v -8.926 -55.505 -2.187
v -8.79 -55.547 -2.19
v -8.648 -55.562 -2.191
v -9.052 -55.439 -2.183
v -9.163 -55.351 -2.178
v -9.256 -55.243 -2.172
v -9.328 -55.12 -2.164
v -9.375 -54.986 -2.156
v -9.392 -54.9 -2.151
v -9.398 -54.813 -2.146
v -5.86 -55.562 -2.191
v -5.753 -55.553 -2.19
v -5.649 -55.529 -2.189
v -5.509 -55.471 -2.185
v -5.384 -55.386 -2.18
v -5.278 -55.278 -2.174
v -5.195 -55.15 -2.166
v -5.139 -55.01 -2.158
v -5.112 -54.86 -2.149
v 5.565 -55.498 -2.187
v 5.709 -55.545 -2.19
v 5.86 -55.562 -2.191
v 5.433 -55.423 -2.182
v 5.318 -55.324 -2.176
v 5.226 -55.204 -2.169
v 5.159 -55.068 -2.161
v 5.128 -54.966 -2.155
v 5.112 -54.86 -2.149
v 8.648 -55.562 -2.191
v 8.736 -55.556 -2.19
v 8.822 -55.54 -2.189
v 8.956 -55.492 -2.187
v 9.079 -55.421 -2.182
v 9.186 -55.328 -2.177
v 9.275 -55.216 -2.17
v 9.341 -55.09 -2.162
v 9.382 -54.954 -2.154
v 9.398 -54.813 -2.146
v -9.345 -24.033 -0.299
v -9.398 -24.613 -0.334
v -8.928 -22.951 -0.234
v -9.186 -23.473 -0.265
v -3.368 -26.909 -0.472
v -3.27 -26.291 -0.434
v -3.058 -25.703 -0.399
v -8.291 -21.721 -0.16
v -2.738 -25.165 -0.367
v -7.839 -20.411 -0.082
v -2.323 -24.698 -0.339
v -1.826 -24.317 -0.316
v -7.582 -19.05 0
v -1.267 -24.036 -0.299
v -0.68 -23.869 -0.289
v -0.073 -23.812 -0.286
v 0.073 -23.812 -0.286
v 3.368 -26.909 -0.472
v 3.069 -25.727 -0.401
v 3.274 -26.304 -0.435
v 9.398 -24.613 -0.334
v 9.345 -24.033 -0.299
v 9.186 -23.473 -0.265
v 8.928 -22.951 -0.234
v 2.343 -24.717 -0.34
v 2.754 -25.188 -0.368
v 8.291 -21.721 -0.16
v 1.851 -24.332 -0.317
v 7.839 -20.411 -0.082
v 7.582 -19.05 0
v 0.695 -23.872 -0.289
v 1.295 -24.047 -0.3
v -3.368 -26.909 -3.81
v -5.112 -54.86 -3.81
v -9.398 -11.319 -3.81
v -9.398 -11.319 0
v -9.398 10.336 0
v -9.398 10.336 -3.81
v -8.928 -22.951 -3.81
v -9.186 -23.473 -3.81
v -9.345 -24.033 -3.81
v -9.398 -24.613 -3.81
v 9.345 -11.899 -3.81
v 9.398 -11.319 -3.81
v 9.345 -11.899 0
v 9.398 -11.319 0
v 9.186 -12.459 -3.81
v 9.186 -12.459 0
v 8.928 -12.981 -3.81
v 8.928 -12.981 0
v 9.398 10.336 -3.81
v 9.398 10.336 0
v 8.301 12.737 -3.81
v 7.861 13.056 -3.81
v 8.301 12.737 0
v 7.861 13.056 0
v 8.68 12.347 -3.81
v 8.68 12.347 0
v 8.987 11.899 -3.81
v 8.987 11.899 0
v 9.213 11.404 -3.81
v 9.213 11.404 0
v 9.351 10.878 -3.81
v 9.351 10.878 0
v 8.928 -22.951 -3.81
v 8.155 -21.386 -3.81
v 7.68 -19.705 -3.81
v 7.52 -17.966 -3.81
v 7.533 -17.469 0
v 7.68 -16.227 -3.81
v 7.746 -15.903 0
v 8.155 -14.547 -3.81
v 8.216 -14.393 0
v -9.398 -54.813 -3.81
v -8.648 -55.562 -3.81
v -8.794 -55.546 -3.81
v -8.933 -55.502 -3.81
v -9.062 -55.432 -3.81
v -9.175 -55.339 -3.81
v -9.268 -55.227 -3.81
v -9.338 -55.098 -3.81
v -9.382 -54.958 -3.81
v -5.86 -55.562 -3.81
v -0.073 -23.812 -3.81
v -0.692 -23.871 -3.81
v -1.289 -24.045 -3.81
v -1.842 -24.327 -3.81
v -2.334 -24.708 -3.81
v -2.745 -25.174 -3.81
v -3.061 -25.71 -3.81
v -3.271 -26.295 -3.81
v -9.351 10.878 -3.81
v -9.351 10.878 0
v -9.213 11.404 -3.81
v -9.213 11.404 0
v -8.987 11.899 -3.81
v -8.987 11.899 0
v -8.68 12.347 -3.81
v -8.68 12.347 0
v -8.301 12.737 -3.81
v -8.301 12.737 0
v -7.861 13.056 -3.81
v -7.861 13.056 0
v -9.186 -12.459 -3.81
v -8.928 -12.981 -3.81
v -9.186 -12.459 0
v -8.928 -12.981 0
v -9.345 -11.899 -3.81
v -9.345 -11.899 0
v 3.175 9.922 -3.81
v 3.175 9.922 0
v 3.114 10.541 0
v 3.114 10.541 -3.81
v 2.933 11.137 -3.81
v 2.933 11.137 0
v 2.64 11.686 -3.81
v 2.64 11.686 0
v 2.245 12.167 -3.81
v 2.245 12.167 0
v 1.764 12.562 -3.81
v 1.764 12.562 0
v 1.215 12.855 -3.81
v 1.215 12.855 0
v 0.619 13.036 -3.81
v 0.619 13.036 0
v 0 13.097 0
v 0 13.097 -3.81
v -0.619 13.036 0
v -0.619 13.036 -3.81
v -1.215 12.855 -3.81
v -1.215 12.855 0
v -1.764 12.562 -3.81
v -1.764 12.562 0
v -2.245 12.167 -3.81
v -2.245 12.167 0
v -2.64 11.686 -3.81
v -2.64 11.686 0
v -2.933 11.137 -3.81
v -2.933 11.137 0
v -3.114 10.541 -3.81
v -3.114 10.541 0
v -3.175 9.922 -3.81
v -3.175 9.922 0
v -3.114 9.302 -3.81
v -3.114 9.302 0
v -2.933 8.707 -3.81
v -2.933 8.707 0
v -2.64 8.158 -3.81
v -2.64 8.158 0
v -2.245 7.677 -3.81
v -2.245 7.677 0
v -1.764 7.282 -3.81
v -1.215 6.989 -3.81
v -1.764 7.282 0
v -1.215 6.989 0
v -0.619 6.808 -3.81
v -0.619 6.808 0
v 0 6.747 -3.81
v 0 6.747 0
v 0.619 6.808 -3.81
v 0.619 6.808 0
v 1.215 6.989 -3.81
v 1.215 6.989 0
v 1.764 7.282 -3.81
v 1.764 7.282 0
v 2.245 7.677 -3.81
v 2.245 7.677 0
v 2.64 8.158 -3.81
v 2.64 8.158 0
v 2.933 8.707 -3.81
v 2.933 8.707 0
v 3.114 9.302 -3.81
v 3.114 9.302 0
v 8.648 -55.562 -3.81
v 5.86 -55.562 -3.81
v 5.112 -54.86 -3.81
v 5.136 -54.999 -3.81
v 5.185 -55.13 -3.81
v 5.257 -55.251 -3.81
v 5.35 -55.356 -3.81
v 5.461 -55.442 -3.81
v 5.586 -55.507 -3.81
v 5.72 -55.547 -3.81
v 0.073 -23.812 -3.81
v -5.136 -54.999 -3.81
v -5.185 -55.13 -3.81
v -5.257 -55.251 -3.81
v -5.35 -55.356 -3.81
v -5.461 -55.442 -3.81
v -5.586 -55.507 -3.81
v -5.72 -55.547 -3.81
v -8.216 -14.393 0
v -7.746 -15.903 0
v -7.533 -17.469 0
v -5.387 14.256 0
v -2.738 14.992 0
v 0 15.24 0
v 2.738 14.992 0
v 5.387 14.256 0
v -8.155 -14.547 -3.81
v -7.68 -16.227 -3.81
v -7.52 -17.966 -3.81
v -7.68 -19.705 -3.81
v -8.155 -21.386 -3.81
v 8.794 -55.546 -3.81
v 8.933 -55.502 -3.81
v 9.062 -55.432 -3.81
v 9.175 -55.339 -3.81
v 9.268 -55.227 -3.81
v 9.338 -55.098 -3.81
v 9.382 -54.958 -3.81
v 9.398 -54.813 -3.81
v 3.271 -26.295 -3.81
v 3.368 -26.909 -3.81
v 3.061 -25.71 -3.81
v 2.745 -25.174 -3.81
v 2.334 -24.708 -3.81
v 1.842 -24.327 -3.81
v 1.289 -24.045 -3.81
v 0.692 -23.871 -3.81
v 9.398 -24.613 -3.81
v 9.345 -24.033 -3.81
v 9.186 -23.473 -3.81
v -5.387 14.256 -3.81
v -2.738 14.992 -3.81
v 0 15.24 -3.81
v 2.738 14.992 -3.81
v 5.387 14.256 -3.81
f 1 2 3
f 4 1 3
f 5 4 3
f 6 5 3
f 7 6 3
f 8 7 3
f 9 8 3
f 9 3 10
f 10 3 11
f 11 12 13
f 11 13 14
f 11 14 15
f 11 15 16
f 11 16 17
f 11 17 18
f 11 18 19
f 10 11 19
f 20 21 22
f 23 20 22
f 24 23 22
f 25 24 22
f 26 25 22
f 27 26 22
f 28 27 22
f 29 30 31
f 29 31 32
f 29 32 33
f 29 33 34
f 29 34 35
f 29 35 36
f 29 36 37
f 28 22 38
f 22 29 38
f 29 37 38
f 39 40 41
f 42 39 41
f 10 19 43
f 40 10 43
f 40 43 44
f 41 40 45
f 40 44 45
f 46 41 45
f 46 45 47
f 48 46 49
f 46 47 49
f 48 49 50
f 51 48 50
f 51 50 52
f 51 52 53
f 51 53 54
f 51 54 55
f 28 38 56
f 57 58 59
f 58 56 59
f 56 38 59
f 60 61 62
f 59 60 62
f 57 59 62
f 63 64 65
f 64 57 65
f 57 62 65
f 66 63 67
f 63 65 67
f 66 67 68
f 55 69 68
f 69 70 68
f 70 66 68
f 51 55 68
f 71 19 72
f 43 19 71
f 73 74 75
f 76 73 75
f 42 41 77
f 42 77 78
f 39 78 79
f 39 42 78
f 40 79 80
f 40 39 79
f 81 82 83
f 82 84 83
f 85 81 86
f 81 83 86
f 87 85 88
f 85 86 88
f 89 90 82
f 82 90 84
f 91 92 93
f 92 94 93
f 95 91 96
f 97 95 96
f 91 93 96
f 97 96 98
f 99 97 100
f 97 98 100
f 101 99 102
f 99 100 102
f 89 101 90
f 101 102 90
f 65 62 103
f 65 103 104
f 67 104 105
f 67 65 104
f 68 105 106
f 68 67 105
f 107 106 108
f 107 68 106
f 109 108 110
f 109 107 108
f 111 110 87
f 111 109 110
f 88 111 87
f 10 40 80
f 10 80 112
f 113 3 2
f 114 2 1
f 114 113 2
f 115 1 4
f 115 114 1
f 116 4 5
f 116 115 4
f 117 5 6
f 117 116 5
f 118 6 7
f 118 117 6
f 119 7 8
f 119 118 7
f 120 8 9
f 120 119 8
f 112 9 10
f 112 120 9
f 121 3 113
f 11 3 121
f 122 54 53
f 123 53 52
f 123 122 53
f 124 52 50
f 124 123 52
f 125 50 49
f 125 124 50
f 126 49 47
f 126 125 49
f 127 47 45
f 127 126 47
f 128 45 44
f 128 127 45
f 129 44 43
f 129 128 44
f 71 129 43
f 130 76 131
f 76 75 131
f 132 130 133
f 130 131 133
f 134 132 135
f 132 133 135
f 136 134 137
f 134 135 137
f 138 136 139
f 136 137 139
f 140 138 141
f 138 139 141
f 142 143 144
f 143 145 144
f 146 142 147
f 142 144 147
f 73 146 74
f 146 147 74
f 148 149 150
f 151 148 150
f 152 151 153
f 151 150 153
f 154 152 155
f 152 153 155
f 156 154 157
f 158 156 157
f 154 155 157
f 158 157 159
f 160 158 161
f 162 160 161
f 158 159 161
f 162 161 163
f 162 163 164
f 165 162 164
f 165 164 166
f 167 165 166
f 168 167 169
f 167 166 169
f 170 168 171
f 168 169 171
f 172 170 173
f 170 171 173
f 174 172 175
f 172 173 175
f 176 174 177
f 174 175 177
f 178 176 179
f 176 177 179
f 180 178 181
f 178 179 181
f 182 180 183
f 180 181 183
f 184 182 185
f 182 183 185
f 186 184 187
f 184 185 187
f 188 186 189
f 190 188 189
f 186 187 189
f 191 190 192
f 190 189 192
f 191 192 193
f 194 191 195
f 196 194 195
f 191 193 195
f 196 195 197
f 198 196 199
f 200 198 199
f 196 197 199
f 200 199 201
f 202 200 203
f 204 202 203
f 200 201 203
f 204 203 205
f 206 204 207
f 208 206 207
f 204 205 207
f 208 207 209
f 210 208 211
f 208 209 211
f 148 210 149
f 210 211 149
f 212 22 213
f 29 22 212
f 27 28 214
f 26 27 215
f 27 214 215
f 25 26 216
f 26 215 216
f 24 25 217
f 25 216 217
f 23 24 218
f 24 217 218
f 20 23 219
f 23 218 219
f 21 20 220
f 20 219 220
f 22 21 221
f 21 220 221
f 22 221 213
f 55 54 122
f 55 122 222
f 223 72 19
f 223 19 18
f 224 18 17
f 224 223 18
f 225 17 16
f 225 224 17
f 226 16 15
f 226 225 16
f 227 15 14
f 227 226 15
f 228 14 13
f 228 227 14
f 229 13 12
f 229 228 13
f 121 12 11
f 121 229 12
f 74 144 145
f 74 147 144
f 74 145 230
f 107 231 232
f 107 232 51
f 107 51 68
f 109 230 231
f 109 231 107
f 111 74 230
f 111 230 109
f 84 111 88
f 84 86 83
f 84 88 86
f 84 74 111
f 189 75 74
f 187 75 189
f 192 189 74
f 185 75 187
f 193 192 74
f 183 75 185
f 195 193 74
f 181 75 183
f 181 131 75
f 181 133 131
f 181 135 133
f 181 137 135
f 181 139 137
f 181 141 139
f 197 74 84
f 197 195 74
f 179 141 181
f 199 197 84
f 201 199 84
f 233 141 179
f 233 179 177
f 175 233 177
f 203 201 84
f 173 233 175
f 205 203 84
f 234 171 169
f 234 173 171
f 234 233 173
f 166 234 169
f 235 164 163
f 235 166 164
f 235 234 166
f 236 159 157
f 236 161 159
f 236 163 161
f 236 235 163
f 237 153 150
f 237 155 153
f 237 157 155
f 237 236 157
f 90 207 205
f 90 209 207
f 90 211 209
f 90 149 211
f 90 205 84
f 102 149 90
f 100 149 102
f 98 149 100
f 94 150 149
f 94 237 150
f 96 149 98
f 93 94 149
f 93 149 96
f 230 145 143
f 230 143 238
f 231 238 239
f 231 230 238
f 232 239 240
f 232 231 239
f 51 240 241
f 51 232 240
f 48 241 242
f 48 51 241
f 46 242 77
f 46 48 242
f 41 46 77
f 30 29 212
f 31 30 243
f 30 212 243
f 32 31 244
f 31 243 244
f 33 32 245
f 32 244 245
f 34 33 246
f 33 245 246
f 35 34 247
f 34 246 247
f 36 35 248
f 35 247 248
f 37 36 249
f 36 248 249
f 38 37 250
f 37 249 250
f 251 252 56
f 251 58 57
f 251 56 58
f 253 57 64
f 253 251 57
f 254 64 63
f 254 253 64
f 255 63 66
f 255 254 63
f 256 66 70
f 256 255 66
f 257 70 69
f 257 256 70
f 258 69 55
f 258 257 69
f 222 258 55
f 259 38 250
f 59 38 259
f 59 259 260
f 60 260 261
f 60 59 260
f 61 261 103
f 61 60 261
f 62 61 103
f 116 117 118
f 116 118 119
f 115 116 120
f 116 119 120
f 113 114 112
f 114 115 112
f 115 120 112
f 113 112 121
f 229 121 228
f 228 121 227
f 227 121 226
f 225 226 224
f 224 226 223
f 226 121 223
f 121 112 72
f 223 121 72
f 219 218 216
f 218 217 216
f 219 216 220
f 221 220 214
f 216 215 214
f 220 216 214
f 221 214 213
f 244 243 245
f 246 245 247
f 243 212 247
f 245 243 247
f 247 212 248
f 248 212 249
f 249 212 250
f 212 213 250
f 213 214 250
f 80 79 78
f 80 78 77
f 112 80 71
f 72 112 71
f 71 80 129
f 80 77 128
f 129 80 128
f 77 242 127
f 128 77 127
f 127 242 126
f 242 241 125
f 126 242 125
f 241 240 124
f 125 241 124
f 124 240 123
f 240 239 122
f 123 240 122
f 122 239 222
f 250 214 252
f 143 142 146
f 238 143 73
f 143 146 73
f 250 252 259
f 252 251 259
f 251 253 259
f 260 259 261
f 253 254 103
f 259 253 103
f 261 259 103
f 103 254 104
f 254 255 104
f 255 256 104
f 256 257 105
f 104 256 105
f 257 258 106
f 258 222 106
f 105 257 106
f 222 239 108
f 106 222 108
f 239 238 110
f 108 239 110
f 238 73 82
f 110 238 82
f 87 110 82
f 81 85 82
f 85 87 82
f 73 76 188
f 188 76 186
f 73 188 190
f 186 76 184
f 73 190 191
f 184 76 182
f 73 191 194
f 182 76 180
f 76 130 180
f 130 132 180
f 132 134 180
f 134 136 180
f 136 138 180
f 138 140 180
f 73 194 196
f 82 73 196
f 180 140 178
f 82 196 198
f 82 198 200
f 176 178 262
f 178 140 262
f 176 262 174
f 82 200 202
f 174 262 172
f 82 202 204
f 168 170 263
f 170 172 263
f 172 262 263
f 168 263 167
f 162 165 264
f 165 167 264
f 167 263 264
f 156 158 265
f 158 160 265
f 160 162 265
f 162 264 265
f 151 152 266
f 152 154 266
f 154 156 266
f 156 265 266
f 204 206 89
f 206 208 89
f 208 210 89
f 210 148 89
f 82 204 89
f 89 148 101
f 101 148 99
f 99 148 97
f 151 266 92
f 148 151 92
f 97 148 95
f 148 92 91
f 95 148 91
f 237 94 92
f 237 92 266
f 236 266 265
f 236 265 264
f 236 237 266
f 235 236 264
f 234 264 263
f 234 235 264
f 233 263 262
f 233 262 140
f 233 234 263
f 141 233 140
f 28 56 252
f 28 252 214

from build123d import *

# Parameters (mm, degrees)
F0_R        = 3.175
F1_DEPTH    = 3.81
F2_R        = 3.302
F3_T1_DEPTH = 7.6195000328
F3_T3_DEPTH = 7.3891966687
F5_DEPTH    = 3.811
F6_R        = 3.175
F8_DEPTH    = 18.797


# Not quite as in the source:
# - a fillet or chamfer that OpenCascade refuses, or shapes differently, is made with other operations: its cross-section is extruded or revolved along the edge and cut away or added


with BuildPart() as f1:
    # F0 (on Top) → F1 (new body)
    with BuildSketch(Plane.XY):
        with BuildLine():
            ThreePointArc((8.9284270597, -22.9513050998), (7.6006411438, -16.7271260659), (10.4890512239, -11.0561025874))
            ThreePointArc((10.4890512239, -11.0561025874), (0, 15.24), (-10.4890512239, -11.0561025874))
            ThreePointArc((-10.4890512239, -11.0561025874), (-7.6006411438, -16.7271260659), (-8.9284270597, -22.9513050998))
            ThreePointArc((-8.9284270597, -22.9513050998), (-9.2783523459, -23.7496251472), (-9.398, -24.6130178983))
            Line((-9.398, -24.6130178983), (-9.398, -55.5625))
            Line((-9.398, -55.5625), (-5.1562, -55.5625))
            Line((-5.1562, -55.5625), (-3.175, -23.8125))
            Line((-3.175, -23.8125), (3.175, -23.8125))
            Line((3.175, -23.8125), (5.1562, -55.5625))
            Line((5.1562, -55.5625), (9.398, -55.5625))
            Line((9.398, -55.5625), (9.398, -24.6130178983))
            ThreePointArc((9.398, -24.6130178983), (9.2783523459, -23.7496251472), (8.9284270597, -22.9513050998))
        make_face()
        with Locations((0, 9.921875)):
            Circle(F0_R, mode=Mode.SUBTRACT)
    extrude(amount=-F1_DEPTH)

    # F2
    f2_edges = [f1.edges().sort_by_distance(p)[0] for p in [
        (-3.175, -23.8125, -1.905),
        (3.175, -23.8125, -1.905),
    ]]
    fillet(f2_edges, radius=F2_R)

    # F3: fillet of radius 0.762 on 4 edges, made by hand

    # F3_s2 → F3_t1 (cut)
    with BuildSketch(Plane.XY.offset(-5.7147500164)):
        with BuildLine():
            ThreePointArc((8.6361, -55.5626), (9.1749153673, -55.3394153673), (9.3981, -54.8006))
            Line((9.3981, -54.8006), (9.41334, -54.8006))
            ThreePointArc((9.41334, -54.8006), (9.41324, -55.18155), (9.41324, -55.5625))
            Line((9.41324, -55.5625), (9.398, -55.57774))
            ThreePointArc((9.398, -55.57774), (9.01705, -55.57774), (8.6361, -55.57784))
            Line((8.6361, -55.57784), (8.6361, -55.5626))
        make_face()
        with BuildLine():
            ThreePointArc((-8.6361, -55.5626), (-9.1749153673, -55.3394153673), (-9.3981, -54.8006))
            Line((-9.3981, -54.8006), (-9.41334, -54.8006))
            ThreePointArc((-9.41334, -54.8006), (-9.41324, -55.18155), (-9.41324, -55.5625))
            Line((-9.41324, -55.5625), (-9.398, -55.57774))
            ThreePointArc((-9.398, -55.57774), (-9.01705, -55.57774), (-8.6361, -55.57784))
            Line((-8.6361, -55.57784), (-8.6361, -55.5626))
        make_face()
    extrude(amount=F3_T1_DEPTH, mode=Mode.SUBTRACT)

    # F3_s4 → F3_t3 (cut)
    with BuildSketch(Plane.XY.offset(-5.5995983343)):
        with BuildLine():
            ThreePointArc((-5.111518531, -54.8480564977), (-5.350272066, -55.3559403691), (-5.8720393267, -55.5626))
            Line((-5.8720393267, -55.5626), (-5.8720393267, -55.57784))
            ThreePointArc((-5.8720393267, -55.57784), (-5.5141196634, -55.57774), (-5.1562, -55.57774))
            Line((-5.1562, -55.57774), (-5.1409895841, -55.56344913))
            ThreePointArc((-5.1409895841, -55.56344913), (-5.1186987525, -55.2062242648), (-5.096308115, -54.8490056276))
            Line((-5.096308115, -54.8490056276), (-5.111518531, -54.8480564977))
        make_face()
        with BuildLine():
            ThreePointArc((5.111518531, -54.8480564977), (5.350272066, -55.3559403691), (5.8720393267, -55.5626))
            Line((5.8720393267, -55.5626), (5.8720393267, -55.57784))
            ThreePointArc((5.8720393267, -55.57784), (5.5141196634, -55.57774), (5.1562, -55.57774))
            Line((5.1562, -55.57774), (5.1409895841, -55.56344913))
            ThreePointArc((5.1409895841, -55.56344913), (5.1186987525, -55.2062242648), (5.096308115, -54.8490056276))
            Line((5.096308115, -54.8490056276), (5.111518531, -54.8480564977))
        make_face()
    extrude(amount=F3_T3_DEPTH, mode=Mode.SUBTRACT)

    # F4 (on face) → F5 (cut, through all)
    with BuildSketch(Plane.XY):
        Polygon((-9.398, -15.875), (-9.398, 17.78), (9.398, 17.78), (9.398, -15.875), (19.05, -15.875), (19.05, 20.32), (-19.05, 20.32), (-19.05, -15.875), align=None)
    extrude(amount=-F5_DEPTH, mode=Mode.SUBTRACT)

    # F6
    f6_edges = [f1.edges().sort_by_distance(p)[0] for p in [
        (9.398, 11.9973, -1.905),
        (-9.398, 11.9973, -1.905),
        (-9.398, -12.286952, -1.905),
        (9.398, -12.286952, -1.905),
    ]]
    fillet(f6_edges, radius=F6_R)

    # F7 (on face) → F8 (cut, through all)
    with BuildSketch(Plane.YZ.offset(9.398)):
        Polygon((-57.15, 0), (-57.15, -2.286), (-19.05, 0), align=None)
    extrude(amount=-F8_DEPTH, mode=Mode.SUBTRACT)


solid = f1.part
